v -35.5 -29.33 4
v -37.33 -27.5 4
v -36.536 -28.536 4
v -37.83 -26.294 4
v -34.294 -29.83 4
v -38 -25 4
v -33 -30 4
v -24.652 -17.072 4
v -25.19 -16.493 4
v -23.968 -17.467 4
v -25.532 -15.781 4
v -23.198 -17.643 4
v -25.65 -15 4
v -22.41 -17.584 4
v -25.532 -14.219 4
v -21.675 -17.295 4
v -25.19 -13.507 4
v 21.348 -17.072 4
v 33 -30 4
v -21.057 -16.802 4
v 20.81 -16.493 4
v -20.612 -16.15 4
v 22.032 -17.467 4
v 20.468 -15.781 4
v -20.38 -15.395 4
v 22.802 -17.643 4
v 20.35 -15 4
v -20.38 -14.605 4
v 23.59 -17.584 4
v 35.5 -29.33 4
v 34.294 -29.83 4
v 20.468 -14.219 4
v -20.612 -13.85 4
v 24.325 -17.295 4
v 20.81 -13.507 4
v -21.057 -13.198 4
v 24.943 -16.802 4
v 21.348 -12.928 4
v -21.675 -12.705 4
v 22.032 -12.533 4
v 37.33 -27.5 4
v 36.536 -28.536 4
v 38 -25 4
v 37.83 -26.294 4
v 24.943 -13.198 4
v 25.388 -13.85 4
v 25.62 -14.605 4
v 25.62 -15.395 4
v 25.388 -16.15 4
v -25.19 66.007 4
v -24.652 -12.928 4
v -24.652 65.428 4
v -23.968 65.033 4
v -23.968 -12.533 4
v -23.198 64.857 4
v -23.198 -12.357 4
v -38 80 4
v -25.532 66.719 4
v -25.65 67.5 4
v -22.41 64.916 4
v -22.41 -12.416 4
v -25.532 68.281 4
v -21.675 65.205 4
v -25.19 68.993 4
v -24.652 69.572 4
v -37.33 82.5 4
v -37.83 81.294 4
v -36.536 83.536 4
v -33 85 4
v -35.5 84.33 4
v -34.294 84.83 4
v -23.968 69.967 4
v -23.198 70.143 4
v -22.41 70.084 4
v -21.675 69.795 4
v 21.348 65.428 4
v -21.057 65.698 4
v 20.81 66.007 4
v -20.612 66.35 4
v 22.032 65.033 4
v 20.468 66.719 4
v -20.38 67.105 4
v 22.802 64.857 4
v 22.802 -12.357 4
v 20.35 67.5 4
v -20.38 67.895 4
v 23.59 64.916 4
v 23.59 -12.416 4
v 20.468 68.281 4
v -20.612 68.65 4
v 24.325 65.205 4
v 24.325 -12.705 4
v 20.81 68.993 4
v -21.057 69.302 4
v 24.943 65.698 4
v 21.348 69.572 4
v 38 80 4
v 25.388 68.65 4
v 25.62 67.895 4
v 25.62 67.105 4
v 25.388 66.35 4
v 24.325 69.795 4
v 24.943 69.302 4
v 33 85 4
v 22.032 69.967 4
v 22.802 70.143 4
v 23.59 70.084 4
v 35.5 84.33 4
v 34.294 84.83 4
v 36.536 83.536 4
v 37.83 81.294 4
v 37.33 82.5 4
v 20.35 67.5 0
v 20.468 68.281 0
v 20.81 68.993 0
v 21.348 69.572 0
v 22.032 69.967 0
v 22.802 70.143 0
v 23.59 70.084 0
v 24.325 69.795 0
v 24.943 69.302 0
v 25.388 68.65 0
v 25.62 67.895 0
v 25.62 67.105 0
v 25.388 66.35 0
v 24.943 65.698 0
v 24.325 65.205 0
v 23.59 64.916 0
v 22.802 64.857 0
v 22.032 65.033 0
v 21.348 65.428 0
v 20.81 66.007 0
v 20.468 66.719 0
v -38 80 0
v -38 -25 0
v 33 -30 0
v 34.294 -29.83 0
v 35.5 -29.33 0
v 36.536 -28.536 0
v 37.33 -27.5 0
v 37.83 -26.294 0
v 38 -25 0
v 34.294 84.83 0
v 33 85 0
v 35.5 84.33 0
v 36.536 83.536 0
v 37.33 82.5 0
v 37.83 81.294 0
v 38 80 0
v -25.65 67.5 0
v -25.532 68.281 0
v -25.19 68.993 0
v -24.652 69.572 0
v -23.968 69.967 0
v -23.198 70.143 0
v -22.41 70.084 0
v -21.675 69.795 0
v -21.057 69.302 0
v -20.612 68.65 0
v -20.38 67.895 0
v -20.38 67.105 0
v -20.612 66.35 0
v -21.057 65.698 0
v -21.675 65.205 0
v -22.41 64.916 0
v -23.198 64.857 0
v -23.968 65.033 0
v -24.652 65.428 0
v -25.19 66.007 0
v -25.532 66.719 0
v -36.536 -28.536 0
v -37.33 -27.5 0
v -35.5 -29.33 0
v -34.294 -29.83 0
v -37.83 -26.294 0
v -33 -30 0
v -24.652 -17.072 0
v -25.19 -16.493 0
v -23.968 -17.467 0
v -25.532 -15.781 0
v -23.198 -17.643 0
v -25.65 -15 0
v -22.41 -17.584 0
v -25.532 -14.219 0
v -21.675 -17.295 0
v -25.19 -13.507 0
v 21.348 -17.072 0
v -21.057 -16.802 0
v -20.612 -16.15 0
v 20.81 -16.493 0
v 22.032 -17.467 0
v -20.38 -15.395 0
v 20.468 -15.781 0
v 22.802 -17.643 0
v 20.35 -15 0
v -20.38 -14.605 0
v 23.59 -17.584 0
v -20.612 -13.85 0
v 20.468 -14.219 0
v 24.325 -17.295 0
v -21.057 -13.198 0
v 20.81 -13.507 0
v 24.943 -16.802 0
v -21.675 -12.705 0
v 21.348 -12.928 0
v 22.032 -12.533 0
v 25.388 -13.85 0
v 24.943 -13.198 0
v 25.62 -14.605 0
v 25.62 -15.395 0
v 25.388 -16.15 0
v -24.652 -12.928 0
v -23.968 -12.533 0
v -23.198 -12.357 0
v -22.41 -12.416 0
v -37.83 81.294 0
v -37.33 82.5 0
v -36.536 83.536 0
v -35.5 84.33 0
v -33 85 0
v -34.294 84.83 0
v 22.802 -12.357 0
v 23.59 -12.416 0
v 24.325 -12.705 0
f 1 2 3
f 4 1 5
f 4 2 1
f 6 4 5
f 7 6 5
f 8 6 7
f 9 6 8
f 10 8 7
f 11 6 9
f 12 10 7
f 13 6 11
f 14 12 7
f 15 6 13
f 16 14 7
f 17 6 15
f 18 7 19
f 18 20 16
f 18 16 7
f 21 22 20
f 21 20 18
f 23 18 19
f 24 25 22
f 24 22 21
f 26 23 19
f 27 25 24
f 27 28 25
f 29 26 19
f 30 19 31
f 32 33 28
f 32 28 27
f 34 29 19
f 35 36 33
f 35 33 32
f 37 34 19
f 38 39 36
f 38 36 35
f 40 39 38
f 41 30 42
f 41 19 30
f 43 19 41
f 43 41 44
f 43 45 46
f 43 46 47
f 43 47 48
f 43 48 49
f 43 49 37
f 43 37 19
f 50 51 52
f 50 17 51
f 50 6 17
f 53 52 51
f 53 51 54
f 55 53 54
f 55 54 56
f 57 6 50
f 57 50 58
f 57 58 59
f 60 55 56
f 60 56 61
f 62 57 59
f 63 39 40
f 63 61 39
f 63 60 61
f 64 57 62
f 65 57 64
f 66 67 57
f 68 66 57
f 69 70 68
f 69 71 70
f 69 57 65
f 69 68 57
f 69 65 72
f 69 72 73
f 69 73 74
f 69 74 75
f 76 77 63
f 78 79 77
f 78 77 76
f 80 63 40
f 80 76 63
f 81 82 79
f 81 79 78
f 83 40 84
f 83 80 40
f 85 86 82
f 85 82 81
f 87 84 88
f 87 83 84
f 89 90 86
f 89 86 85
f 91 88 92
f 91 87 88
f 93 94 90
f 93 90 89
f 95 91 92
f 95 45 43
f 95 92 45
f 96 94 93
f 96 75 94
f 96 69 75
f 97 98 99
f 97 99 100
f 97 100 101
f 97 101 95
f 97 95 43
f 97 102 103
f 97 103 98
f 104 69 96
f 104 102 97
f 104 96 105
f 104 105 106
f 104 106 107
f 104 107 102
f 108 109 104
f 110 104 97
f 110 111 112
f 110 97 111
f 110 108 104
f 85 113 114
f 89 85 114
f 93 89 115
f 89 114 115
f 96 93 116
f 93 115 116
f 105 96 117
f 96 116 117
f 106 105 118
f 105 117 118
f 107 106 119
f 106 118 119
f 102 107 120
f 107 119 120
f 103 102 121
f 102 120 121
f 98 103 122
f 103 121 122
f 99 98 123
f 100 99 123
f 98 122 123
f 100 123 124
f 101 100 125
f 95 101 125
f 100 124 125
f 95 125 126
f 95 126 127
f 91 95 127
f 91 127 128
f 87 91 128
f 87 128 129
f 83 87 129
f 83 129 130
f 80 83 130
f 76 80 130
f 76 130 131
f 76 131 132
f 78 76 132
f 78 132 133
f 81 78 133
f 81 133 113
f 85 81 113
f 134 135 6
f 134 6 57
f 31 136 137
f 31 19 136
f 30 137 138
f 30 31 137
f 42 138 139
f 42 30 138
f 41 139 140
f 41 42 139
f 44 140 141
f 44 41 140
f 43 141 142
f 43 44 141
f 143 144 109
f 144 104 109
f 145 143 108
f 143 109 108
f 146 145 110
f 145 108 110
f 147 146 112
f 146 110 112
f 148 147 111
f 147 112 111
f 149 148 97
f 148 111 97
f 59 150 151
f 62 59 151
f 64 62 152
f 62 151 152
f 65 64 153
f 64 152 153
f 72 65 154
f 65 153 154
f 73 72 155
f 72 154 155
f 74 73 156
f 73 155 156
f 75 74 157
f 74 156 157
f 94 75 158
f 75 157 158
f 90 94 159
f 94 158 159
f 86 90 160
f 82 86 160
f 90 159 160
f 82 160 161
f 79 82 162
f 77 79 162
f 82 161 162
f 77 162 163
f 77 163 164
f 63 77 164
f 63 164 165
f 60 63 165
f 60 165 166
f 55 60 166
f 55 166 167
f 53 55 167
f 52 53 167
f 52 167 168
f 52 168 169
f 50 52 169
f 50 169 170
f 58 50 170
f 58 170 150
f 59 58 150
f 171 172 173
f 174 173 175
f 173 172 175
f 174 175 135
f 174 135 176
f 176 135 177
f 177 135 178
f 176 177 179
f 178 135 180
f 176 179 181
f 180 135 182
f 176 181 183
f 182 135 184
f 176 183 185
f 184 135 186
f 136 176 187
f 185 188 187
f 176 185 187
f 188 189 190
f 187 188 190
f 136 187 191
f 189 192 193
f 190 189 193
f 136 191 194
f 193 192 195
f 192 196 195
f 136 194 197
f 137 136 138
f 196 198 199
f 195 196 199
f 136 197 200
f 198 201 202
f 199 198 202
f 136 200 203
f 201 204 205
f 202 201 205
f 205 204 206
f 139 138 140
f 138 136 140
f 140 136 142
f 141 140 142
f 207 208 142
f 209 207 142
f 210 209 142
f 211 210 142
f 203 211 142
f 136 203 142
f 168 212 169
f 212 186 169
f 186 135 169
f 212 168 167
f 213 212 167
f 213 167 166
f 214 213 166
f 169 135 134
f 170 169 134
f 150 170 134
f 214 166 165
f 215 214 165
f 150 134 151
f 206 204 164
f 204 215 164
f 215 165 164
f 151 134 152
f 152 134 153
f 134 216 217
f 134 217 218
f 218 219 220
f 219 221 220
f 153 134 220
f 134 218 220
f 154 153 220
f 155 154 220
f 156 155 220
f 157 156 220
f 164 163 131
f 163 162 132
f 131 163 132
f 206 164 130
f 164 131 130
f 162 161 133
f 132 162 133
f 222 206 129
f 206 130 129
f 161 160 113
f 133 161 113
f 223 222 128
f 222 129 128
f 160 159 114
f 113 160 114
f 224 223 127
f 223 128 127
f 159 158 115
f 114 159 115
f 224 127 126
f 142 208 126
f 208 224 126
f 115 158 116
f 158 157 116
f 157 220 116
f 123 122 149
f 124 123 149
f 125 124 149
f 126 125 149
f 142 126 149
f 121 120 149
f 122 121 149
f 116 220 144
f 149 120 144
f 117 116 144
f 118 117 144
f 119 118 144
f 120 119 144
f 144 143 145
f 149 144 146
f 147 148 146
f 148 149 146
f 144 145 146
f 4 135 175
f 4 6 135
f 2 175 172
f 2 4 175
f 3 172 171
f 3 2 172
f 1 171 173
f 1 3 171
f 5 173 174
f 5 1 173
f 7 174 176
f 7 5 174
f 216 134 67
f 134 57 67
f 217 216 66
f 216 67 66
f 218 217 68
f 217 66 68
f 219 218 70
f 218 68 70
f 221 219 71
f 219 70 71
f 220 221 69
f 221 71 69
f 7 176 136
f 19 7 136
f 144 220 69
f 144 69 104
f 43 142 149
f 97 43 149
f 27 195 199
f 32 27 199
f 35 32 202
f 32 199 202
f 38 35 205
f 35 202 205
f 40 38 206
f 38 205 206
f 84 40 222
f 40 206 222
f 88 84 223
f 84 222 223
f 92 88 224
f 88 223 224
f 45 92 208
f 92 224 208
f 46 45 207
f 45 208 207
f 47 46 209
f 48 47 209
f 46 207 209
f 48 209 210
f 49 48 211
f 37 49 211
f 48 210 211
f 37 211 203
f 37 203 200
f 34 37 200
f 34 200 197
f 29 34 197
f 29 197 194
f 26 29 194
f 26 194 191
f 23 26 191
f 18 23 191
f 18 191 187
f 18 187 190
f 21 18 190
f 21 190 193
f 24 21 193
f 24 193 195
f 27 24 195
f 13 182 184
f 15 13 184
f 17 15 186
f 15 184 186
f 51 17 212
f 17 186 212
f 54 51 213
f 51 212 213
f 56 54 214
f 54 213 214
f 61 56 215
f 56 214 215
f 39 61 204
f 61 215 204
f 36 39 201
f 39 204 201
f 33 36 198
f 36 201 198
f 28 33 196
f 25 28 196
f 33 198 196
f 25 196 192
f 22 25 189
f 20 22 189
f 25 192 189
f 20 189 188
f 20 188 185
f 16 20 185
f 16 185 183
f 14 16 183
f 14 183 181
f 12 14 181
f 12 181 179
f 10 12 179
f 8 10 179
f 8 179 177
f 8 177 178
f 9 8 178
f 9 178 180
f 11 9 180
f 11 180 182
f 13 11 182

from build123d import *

# Parameters (mm, degrees)
SKETCH1_W            = 76
SKETCH1_H            = 115
BOSS_EXTRUDE1_DEPTH  = 4
M5_CLEARANCE_HOLE1_D = 5.3
FILLET1_R            = 5


with BuildPart() as part:
    # Sketch1 → Boss-Extrude1 (new body)
    with BuildSketch(Plane.XY):
        with Locations((0, 27.5)):
            Rectangle(SKETCH1_W, SKETCH1_H)
    extrude(amount=BOSS_EXTRUDE1_DEPTH)

    # M5 Clearance Hole1 (through all)
    with Locations(Plane.XY.offset(4)):
        with Locations((-23, 67.5), (-23, -15), (23, -15), (23, 67.5)):
            Hole(M5_CLEARANCE_HOLE1_D / 2)

    # Fillet1
    fillet1_edges = [part.edges().sort_by_distance(p)[0] for p in [
        (-38, 85, 2),
        (38, 85, 2),
        (38, -30, 2),
        (-38, -30, 2),
    ]]
    fillet(fillet1_edges, radius=FILLET1_R)


solid = part.part
